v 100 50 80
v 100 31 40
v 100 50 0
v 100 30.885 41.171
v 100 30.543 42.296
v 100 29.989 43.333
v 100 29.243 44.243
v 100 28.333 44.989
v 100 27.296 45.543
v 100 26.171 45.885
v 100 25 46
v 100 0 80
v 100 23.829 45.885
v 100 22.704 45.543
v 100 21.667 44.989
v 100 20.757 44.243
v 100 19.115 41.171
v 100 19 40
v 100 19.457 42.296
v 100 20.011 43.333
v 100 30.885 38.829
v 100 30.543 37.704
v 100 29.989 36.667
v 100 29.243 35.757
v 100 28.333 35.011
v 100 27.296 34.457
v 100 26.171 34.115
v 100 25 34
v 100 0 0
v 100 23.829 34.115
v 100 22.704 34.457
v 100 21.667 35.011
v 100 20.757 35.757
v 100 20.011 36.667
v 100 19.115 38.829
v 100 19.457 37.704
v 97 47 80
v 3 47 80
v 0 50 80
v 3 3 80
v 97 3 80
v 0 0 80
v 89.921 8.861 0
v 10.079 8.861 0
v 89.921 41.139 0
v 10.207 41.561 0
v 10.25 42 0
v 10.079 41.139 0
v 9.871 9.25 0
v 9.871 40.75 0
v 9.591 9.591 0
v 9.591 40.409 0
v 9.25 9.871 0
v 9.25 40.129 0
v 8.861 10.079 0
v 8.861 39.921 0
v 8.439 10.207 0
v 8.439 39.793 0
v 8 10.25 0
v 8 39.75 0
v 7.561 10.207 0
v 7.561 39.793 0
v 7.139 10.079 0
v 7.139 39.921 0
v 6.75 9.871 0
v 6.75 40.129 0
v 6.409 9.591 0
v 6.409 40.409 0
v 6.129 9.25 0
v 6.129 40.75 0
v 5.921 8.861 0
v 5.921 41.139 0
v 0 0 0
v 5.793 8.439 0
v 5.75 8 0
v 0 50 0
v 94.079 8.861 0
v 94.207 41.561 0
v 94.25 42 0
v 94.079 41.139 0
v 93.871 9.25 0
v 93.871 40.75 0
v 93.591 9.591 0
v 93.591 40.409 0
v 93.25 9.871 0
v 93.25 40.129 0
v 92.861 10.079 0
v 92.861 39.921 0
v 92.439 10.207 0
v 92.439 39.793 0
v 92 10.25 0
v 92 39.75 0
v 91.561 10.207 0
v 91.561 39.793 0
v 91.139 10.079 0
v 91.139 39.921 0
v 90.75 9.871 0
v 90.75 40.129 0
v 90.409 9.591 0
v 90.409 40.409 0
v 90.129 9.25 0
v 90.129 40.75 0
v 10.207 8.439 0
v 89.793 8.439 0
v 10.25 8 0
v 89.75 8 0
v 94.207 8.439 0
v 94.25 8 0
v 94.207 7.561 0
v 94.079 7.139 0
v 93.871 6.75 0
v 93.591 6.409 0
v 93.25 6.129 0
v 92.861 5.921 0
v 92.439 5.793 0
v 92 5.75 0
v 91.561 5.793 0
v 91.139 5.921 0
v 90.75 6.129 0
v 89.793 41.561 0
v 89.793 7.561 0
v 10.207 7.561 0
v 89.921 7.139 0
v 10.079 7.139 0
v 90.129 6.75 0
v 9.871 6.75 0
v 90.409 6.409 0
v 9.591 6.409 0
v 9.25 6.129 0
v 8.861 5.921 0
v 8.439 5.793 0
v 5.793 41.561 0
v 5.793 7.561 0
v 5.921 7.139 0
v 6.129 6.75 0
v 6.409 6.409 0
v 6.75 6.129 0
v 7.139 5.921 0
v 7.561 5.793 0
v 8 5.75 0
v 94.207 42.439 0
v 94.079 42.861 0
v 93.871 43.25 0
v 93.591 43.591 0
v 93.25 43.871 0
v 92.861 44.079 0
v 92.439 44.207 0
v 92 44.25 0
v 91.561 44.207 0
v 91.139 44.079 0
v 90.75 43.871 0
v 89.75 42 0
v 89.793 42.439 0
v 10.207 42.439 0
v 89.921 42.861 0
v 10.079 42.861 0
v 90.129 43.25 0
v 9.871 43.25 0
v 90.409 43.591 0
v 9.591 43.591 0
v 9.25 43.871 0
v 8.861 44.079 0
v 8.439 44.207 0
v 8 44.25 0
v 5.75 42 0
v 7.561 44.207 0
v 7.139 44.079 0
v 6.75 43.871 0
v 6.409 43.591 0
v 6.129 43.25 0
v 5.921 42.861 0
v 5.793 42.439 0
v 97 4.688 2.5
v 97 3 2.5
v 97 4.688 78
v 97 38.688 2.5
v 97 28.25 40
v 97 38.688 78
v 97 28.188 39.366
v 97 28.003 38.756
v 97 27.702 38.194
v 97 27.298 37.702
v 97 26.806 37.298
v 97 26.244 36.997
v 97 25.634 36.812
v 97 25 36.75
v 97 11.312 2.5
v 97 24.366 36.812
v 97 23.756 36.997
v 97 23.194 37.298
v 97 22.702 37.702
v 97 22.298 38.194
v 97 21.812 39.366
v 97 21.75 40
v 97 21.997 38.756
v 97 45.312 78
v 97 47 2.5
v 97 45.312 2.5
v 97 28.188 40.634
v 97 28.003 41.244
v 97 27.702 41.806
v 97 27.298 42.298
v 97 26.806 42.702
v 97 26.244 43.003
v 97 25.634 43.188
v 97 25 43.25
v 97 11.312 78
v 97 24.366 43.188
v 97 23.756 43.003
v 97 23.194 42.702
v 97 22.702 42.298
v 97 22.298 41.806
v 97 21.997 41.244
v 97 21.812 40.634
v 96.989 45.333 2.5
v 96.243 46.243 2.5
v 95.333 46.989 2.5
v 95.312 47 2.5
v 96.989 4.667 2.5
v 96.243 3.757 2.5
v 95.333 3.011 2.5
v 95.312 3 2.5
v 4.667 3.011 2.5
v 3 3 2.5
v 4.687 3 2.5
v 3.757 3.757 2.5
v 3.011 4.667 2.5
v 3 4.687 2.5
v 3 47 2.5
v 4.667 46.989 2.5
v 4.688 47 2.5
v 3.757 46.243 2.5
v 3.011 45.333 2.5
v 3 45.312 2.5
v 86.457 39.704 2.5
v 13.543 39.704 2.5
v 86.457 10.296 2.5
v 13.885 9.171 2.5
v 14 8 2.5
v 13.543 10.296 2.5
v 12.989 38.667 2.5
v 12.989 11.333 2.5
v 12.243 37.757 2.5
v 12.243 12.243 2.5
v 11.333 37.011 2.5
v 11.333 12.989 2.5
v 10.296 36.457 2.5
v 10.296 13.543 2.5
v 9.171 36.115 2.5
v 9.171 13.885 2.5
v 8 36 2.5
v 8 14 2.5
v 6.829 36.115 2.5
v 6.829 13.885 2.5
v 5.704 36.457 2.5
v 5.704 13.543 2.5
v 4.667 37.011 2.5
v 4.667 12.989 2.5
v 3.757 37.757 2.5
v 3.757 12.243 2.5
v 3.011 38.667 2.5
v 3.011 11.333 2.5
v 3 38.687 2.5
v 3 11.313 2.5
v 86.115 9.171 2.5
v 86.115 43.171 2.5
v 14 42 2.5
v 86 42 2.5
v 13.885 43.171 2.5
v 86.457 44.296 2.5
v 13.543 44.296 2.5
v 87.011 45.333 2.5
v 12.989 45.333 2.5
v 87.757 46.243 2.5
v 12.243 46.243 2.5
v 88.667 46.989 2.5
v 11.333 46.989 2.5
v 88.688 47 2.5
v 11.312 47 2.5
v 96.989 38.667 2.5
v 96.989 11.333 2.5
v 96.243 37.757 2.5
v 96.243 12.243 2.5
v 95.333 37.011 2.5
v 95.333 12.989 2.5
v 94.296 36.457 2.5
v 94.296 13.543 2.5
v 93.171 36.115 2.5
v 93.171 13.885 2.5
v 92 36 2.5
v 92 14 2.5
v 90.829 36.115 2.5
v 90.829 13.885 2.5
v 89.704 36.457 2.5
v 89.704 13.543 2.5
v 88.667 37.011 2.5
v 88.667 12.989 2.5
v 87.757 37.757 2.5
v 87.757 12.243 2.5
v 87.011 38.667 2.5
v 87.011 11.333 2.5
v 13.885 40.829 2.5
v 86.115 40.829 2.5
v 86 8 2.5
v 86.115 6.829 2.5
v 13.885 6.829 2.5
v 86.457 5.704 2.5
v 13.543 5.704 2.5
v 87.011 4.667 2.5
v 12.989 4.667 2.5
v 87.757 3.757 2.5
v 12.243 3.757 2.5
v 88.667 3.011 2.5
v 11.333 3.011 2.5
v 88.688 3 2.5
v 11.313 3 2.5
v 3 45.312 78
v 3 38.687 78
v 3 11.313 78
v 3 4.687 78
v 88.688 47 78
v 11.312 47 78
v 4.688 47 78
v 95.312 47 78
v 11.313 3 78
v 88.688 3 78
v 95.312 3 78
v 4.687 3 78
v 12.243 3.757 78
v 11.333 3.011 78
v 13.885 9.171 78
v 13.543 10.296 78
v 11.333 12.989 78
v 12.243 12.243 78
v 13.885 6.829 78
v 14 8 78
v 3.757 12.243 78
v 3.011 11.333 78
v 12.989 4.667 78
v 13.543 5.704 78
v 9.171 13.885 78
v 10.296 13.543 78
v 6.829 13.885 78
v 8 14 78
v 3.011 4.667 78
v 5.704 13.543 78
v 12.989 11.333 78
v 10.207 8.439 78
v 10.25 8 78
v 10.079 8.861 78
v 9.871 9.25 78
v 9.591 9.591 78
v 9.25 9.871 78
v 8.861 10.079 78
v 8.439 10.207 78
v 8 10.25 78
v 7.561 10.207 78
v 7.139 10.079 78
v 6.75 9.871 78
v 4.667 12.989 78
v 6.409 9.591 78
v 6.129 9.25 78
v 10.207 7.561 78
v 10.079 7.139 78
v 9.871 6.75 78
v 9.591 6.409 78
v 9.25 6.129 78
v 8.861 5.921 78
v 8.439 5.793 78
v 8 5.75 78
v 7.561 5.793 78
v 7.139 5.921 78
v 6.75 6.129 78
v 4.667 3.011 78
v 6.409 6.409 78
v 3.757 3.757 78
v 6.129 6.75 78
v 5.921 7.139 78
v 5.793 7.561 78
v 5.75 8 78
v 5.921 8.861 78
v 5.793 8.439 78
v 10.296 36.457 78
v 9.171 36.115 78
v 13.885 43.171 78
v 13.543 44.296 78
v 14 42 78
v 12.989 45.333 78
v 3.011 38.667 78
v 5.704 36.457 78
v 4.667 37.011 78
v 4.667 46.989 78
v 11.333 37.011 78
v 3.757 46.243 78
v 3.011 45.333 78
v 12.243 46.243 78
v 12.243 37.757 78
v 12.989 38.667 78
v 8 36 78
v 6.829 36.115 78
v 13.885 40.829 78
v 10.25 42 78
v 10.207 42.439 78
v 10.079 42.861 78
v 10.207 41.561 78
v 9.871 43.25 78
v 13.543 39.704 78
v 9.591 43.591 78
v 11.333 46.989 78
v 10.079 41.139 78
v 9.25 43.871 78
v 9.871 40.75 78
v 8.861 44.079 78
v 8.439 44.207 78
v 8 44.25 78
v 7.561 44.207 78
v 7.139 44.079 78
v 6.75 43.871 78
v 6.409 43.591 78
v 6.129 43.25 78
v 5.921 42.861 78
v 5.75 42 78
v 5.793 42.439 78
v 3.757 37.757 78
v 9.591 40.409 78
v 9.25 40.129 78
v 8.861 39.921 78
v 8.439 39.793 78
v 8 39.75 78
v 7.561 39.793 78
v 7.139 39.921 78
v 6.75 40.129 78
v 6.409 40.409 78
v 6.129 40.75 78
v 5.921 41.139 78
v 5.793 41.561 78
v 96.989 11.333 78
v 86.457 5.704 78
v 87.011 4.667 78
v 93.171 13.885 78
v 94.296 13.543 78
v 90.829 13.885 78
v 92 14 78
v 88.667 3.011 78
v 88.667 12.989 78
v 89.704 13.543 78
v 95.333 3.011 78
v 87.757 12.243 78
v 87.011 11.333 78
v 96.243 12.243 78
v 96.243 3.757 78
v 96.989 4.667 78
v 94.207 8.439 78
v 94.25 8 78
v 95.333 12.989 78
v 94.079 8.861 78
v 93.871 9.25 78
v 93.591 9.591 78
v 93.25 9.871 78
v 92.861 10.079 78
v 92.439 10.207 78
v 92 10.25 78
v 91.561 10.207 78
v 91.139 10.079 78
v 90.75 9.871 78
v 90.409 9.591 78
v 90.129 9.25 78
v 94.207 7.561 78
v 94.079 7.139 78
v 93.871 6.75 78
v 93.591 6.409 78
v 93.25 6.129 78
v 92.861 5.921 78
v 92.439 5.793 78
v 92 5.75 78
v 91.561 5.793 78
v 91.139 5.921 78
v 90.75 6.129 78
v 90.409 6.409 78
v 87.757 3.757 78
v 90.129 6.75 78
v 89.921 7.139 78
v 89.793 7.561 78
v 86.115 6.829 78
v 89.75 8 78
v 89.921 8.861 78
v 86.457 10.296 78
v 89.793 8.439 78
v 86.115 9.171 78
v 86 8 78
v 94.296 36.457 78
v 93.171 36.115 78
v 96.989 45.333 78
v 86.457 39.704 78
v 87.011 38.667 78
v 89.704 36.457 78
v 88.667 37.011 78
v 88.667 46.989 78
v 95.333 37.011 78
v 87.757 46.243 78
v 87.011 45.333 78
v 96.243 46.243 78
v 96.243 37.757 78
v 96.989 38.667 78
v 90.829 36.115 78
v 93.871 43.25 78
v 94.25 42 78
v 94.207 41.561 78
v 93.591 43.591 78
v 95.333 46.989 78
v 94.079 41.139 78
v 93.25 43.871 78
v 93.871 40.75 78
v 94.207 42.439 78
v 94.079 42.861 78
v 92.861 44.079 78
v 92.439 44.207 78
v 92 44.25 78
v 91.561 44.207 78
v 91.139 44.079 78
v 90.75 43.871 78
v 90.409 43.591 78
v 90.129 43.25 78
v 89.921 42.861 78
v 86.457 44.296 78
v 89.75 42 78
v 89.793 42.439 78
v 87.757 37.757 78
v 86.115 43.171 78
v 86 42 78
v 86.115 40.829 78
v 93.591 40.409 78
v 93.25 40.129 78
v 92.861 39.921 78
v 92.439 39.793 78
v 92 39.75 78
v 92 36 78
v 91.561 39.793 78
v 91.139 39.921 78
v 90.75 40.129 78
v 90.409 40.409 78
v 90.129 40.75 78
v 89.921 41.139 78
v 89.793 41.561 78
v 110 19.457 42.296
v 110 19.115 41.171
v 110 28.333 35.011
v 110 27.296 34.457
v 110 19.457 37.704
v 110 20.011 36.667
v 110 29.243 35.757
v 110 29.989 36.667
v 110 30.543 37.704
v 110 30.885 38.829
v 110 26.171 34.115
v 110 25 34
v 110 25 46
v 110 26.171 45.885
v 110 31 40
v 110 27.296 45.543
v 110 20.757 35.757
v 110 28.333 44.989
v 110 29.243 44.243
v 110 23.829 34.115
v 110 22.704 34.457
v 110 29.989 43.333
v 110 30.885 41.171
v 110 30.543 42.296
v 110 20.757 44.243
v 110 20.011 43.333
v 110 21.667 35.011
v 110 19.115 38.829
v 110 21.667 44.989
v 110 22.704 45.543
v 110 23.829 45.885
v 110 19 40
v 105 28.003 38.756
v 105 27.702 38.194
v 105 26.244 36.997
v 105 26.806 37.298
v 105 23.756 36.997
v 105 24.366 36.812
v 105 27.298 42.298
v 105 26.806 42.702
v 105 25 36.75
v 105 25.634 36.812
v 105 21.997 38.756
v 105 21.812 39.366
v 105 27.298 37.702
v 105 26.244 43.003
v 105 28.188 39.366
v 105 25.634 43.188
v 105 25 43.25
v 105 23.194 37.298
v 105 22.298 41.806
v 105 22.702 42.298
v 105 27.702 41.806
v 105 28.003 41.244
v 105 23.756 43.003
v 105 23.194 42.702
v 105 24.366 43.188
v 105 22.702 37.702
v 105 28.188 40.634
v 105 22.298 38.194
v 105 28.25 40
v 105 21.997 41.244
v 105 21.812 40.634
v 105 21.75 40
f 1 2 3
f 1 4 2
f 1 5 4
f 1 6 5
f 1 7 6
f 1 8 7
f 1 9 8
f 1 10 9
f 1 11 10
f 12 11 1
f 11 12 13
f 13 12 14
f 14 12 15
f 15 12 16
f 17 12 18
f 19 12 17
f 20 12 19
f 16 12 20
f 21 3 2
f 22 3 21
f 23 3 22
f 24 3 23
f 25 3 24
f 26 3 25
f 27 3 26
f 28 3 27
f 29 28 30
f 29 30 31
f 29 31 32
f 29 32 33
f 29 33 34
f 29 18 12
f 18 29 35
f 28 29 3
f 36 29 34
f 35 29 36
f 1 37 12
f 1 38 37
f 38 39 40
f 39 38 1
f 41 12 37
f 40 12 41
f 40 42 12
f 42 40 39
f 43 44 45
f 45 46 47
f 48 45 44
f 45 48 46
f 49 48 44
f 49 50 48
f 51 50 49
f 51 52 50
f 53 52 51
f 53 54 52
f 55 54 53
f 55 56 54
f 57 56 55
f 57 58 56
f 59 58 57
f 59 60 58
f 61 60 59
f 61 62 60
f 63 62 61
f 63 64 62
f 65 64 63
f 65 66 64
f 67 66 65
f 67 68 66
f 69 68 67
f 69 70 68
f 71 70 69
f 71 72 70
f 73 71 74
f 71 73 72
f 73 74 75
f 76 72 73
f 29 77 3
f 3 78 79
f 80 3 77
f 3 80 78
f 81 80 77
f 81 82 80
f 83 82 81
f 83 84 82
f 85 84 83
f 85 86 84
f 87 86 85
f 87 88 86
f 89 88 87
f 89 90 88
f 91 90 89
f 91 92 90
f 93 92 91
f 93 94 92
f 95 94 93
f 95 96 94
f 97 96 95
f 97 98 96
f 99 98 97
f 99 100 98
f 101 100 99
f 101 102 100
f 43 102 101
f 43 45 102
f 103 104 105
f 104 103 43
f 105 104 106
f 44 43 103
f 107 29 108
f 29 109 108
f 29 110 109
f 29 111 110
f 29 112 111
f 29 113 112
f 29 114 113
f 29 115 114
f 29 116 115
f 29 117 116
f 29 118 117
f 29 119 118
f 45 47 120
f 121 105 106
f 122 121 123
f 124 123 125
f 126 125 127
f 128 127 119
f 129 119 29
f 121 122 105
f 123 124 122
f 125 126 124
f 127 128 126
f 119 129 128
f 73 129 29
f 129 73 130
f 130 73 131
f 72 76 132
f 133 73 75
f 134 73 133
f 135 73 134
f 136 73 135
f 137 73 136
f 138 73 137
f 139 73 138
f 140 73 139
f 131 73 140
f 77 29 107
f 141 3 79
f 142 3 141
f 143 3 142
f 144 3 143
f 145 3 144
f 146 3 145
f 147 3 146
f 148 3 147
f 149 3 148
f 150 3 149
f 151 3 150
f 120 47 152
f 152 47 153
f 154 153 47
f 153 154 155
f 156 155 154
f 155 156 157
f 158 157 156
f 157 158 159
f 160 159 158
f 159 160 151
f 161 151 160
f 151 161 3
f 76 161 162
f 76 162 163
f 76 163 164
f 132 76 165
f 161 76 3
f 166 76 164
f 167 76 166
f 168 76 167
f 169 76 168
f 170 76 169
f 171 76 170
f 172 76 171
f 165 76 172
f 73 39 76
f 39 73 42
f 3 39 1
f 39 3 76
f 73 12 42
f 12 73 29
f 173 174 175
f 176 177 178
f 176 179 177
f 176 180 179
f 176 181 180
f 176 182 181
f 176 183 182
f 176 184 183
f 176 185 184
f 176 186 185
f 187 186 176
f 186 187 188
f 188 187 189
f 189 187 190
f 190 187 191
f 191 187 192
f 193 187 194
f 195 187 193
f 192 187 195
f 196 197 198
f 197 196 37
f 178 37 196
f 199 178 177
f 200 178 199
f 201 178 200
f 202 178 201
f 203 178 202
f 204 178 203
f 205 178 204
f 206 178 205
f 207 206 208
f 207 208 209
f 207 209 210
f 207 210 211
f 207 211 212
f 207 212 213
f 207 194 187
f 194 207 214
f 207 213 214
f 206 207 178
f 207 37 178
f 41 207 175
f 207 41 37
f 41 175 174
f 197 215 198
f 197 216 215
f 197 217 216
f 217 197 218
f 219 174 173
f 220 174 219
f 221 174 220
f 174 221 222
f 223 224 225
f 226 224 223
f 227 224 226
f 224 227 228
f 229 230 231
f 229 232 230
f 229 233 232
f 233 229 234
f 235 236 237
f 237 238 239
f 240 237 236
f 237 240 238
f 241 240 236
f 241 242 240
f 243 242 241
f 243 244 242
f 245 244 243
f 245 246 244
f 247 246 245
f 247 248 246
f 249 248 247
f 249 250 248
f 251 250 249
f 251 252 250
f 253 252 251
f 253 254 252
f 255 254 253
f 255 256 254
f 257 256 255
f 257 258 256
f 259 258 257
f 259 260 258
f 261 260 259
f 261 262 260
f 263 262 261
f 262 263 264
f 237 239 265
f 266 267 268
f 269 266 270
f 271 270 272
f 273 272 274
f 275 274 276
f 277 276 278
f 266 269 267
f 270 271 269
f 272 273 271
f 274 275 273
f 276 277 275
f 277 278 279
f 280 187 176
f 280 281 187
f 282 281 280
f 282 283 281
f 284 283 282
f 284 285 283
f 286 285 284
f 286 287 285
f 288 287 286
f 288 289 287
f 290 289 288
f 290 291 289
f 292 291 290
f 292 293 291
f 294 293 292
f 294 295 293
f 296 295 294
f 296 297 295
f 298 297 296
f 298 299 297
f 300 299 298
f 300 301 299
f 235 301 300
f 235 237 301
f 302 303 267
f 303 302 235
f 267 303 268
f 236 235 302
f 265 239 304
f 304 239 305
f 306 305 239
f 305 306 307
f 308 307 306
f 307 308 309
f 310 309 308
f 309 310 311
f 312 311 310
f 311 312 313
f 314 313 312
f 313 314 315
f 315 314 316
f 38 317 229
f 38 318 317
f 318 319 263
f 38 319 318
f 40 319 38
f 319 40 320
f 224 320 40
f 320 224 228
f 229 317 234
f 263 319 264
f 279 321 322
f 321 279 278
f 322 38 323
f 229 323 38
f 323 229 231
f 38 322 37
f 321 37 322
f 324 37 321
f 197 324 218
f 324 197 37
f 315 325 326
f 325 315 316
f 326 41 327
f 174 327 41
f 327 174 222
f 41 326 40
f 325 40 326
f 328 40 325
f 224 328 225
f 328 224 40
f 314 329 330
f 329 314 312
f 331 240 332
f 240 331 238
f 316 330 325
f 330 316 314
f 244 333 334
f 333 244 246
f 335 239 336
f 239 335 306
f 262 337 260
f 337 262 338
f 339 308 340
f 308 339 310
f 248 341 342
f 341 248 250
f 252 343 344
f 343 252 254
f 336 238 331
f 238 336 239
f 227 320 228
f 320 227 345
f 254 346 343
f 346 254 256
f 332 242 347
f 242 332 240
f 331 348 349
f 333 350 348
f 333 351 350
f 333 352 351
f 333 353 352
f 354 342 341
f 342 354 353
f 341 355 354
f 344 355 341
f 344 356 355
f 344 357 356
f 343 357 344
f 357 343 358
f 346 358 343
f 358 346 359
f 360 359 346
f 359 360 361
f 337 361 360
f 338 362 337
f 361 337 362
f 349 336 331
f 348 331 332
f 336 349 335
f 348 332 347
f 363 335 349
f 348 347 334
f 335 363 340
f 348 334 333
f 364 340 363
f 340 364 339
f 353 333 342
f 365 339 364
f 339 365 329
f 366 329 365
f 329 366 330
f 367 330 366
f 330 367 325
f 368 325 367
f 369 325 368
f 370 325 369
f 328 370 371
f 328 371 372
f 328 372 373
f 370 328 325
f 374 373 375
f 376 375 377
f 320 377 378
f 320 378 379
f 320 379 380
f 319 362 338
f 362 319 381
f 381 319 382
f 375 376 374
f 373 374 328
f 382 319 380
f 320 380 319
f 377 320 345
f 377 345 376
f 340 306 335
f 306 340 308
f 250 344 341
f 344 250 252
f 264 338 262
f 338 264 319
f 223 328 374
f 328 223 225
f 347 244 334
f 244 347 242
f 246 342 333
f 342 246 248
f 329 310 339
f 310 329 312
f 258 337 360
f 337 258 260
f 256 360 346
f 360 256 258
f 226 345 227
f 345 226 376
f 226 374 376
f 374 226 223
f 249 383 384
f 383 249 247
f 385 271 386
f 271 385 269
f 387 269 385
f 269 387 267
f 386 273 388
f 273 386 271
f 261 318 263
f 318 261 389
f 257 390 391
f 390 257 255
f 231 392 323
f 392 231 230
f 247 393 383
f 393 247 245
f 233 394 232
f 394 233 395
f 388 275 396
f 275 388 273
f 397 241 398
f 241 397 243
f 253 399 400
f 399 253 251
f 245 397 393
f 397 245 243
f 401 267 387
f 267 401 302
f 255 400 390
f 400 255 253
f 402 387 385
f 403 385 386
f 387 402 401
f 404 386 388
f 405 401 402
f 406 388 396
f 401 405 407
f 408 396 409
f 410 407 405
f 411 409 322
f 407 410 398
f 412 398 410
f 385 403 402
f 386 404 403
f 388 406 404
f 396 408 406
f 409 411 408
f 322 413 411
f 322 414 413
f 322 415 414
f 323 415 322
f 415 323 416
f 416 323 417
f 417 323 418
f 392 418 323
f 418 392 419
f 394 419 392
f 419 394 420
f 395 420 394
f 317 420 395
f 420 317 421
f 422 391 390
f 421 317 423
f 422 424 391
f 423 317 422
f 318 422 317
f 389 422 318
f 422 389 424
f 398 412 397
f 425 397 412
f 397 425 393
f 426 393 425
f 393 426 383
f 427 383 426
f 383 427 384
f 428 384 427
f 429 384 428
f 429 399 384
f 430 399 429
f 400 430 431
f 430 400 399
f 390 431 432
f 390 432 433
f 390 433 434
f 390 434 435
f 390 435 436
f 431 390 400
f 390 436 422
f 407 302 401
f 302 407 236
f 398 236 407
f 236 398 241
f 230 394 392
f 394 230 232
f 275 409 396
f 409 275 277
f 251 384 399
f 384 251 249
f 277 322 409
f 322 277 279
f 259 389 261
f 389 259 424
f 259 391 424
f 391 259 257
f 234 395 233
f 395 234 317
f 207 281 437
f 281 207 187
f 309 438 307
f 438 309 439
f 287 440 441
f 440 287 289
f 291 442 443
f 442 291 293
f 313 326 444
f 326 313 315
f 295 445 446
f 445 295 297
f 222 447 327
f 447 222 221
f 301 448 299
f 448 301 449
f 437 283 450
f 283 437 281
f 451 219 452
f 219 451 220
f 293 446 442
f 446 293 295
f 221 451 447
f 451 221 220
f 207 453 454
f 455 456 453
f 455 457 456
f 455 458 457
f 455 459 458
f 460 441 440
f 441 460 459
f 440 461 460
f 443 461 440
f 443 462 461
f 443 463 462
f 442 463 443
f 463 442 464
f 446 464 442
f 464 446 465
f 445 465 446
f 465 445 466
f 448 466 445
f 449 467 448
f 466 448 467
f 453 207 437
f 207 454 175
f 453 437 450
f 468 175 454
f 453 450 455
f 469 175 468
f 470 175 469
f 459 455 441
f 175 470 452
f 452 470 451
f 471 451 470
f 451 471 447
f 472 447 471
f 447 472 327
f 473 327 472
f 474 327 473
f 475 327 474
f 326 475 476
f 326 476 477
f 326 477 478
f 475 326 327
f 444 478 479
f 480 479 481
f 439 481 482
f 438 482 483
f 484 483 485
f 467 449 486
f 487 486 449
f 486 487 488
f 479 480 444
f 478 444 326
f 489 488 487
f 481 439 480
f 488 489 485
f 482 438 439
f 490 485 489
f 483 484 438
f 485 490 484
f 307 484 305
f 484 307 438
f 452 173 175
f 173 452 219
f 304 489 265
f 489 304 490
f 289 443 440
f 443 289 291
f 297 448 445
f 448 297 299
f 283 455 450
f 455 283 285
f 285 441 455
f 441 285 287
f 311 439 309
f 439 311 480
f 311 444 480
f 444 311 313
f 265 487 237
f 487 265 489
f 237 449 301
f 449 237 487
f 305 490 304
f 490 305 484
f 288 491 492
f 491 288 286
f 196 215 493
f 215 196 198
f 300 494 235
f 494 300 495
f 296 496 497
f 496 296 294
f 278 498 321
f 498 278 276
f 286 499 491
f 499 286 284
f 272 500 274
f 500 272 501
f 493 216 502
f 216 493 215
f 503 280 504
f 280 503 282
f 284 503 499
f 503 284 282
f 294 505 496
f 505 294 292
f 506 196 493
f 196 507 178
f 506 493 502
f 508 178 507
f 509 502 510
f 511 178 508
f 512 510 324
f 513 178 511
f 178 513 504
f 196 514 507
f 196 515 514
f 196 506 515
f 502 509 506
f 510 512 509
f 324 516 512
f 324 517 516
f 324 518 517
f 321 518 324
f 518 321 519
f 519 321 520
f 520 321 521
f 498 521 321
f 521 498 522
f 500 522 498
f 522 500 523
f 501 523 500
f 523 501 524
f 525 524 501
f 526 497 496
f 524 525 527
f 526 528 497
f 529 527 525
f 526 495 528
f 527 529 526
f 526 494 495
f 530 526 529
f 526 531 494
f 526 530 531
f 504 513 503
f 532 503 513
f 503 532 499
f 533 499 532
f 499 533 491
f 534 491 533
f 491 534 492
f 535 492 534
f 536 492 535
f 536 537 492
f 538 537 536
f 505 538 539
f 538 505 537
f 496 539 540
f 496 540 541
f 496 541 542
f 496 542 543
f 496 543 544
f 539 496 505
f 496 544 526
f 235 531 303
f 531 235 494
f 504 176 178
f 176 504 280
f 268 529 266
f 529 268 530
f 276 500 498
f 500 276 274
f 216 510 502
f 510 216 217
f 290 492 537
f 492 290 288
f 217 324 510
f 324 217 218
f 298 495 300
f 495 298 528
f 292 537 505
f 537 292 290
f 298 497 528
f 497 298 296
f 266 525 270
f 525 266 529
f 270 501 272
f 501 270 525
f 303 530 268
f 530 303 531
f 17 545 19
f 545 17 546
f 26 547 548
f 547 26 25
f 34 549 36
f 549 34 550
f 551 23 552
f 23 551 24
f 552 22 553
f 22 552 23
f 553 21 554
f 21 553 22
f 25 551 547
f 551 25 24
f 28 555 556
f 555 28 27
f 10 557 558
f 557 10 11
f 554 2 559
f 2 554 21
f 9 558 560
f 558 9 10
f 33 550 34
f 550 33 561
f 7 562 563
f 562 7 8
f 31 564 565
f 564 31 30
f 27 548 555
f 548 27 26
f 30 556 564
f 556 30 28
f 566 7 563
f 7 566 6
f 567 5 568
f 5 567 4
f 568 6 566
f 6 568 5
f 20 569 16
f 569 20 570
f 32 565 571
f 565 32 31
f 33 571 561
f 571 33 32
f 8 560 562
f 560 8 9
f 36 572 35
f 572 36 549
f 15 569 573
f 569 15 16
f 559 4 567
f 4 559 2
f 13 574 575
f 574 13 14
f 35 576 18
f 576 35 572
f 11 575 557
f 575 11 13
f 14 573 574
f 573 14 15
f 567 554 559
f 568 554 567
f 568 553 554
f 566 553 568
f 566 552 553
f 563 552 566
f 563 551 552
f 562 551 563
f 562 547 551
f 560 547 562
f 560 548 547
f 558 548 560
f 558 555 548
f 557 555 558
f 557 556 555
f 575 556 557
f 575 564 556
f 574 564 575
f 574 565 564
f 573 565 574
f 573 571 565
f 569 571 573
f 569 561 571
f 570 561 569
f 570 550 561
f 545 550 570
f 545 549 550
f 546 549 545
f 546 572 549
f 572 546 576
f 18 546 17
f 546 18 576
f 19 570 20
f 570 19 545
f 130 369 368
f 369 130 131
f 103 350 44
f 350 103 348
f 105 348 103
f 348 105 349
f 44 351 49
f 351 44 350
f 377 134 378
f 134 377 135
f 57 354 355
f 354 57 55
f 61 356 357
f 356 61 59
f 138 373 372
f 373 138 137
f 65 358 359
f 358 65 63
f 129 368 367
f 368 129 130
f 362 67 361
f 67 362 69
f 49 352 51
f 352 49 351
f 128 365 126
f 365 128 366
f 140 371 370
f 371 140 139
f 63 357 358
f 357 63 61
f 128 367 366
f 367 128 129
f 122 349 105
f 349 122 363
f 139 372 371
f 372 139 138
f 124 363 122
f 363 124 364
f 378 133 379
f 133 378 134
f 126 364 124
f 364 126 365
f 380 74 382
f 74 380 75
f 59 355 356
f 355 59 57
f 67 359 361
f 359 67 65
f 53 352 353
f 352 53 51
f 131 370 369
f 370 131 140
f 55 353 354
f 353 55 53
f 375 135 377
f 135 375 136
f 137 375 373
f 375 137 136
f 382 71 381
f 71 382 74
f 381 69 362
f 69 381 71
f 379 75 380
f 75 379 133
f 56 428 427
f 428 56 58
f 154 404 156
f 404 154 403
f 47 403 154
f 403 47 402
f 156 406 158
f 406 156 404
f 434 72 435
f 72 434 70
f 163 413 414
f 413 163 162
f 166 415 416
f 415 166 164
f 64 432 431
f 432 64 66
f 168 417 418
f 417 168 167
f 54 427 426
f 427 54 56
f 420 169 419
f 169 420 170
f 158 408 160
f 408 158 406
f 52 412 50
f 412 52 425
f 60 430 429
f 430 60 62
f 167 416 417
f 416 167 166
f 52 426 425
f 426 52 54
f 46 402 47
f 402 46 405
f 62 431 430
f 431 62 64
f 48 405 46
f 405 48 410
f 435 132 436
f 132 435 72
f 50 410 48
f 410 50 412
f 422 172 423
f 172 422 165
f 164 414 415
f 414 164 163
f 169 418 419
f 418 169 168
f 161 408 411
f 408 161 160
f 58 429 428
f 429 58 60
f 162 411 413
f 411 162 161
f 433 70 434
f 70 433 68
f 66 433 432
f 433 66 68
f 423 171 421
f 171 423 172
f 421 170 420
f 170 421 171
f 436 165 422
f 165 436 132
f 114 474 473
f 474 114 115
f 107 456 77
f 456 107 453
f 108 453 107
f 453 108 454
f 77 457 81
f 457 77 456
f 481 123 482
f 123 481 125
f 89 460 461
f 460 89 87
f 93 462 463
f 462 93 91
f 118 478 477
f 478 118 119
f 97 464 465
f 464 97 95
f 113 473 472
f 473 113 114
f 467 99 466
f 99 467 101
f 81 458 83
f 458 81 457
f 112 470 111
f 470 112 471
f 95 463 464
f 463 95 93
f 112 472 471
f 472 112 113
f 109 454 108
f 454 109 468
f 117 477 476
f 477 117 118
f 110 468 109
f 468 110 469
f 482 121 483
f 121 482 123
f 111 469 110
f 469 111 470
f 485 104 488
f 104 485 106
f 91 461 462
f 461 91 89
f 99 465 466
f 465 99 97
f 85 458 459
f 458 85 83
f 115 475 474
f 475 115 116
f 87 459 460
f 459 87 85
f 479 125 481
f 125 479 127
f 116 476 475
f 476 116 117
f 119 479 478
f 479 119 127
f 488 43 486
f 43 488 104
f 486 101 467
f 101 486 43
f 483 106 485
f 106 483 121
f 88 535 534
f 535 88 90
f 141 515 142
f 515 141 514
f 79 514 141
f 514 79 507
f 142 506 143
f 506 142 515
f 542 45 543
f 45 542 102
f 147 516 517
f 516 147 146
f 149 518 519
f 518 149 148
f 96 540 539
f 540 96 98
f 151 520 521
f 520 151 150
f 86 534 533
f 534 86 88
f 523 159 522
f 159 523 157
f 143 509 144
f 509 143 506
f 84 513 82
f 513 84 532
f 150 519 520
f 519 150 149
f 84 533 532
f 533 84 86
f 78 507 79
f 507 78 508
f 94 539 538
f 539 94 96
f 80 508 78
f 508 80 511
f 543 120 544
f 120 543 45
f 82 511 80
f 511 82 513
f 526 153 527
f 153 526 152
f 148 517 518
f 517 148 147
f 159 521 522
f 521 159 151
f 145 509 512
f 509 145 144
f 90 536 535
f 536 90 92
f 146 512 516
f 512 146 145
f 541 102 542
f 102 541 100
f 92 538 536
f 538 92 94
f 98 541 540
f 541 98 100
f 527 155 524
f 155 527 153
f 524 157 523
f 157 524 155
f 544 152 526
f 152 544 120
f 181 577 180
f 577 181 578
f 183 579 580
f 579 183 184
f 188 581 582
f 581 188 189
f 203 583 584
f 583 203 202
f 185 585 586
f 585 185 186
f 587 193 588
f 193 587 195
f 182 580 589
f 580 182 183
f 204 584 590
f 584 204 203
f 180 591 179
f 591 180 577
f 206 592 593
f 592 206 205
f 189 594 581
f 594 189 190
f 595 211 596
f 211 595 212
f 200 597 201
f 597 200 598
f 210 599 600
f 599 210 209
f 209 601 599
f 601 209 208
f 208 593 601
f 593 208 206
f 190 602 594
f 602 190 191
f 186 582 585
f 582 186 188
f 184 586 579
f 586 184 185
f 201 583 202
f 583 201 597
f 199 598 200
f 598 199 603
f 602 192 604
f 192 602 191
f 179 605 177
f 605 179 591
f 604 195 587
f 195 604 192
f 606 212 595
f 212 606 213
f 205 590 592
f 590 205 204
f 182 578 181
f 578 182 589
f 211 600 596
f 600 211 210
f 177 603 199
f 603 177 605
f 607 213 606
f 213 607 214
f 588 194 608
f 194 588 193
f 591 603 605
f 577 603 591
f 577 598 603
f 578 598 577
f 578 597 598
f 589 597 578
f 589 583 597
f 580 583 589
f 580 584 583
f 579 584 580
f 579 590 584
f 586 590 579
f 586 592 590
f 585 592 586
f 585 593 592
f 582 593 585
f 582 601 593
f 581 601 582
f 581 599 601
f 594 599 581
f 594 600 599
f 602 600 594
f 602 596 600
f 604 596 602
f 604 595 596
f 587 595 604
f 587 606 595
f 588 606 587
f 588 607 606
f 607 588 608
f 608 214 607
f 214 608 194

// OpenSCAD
$fn = 32;
// ----------------------------------------------------------------------
// Enclosure body: 100 x 50 x 80 mm, wall 3 mm
// ----------------------------------------------------------------------

// --- parameters (mm) ---
length = 100;             // outside length, X
width = 50;               // outside width, Y
height = 80;              // outside height, Z
wall = 3;                 // side wall thickness
floor_t = 2.5;            // floor thickness
boss_d = 12;              // corner boss diameter
boss_h = 75.5;            // corner boss height above the floor
boss_hole_d = 4.5;        // lid screw clearance in the boss
boss_lip = 8;             // boss centre inset from the corner
nipple_d = 12;            // cable gland boss diameter
nipple_h = 10;            // cable gland boss height
nipple_bore = 6.5;        // cable gland bore

module shell() {
  difference() {
    cube([length, width, height]);
    /* hollow, open at the top */
    translate([wall, wall, floor_t])
      cube([length - 2 * wall, width - 2 * wall, height]);
  }
}

module bosses() {
  /* corner bosses, sunk 1 mm into the floor */
  for (sx = [0, 1]) for (sy = [0, 1])
    translate([sx * (length - 2 * boss_lip) + boss_lip, sy * (width - 2 * boss_lip) + boss_lip, floor_t - 1])
      cylinder(h = boss_h + 1, d = boss_d);
}

module gland() {
  /* boss on the short wall, sunk 1 mm into it */
  translate([length - 1, width / 2, height * 0.5]) rotate([0, 90, 0])
    cylinder(h = nipple_h + 1, d = nipple_d);
}

difference() {
  union() {
    shell();
    bosses();
    gland();
  }
  /* boss screw holes */
  for (sx = [0, 1]) for (sy = [0, 1])
    translate([sx * (length - 2 * boss_lip) + boss_lip, sy * (width - 2 * boss_lip) + boss_lip, -1]) cylinder(h = floor_t + boss_h + 2, d = boss_hole_d);
  translate([length, width / 2, height * 0.5]) rotate([0, 90, 0]) translate([0, 0, -nipple_h - 2]) cylinder(h = nipple_h + wall + 4, d = nipple_bore);
}
